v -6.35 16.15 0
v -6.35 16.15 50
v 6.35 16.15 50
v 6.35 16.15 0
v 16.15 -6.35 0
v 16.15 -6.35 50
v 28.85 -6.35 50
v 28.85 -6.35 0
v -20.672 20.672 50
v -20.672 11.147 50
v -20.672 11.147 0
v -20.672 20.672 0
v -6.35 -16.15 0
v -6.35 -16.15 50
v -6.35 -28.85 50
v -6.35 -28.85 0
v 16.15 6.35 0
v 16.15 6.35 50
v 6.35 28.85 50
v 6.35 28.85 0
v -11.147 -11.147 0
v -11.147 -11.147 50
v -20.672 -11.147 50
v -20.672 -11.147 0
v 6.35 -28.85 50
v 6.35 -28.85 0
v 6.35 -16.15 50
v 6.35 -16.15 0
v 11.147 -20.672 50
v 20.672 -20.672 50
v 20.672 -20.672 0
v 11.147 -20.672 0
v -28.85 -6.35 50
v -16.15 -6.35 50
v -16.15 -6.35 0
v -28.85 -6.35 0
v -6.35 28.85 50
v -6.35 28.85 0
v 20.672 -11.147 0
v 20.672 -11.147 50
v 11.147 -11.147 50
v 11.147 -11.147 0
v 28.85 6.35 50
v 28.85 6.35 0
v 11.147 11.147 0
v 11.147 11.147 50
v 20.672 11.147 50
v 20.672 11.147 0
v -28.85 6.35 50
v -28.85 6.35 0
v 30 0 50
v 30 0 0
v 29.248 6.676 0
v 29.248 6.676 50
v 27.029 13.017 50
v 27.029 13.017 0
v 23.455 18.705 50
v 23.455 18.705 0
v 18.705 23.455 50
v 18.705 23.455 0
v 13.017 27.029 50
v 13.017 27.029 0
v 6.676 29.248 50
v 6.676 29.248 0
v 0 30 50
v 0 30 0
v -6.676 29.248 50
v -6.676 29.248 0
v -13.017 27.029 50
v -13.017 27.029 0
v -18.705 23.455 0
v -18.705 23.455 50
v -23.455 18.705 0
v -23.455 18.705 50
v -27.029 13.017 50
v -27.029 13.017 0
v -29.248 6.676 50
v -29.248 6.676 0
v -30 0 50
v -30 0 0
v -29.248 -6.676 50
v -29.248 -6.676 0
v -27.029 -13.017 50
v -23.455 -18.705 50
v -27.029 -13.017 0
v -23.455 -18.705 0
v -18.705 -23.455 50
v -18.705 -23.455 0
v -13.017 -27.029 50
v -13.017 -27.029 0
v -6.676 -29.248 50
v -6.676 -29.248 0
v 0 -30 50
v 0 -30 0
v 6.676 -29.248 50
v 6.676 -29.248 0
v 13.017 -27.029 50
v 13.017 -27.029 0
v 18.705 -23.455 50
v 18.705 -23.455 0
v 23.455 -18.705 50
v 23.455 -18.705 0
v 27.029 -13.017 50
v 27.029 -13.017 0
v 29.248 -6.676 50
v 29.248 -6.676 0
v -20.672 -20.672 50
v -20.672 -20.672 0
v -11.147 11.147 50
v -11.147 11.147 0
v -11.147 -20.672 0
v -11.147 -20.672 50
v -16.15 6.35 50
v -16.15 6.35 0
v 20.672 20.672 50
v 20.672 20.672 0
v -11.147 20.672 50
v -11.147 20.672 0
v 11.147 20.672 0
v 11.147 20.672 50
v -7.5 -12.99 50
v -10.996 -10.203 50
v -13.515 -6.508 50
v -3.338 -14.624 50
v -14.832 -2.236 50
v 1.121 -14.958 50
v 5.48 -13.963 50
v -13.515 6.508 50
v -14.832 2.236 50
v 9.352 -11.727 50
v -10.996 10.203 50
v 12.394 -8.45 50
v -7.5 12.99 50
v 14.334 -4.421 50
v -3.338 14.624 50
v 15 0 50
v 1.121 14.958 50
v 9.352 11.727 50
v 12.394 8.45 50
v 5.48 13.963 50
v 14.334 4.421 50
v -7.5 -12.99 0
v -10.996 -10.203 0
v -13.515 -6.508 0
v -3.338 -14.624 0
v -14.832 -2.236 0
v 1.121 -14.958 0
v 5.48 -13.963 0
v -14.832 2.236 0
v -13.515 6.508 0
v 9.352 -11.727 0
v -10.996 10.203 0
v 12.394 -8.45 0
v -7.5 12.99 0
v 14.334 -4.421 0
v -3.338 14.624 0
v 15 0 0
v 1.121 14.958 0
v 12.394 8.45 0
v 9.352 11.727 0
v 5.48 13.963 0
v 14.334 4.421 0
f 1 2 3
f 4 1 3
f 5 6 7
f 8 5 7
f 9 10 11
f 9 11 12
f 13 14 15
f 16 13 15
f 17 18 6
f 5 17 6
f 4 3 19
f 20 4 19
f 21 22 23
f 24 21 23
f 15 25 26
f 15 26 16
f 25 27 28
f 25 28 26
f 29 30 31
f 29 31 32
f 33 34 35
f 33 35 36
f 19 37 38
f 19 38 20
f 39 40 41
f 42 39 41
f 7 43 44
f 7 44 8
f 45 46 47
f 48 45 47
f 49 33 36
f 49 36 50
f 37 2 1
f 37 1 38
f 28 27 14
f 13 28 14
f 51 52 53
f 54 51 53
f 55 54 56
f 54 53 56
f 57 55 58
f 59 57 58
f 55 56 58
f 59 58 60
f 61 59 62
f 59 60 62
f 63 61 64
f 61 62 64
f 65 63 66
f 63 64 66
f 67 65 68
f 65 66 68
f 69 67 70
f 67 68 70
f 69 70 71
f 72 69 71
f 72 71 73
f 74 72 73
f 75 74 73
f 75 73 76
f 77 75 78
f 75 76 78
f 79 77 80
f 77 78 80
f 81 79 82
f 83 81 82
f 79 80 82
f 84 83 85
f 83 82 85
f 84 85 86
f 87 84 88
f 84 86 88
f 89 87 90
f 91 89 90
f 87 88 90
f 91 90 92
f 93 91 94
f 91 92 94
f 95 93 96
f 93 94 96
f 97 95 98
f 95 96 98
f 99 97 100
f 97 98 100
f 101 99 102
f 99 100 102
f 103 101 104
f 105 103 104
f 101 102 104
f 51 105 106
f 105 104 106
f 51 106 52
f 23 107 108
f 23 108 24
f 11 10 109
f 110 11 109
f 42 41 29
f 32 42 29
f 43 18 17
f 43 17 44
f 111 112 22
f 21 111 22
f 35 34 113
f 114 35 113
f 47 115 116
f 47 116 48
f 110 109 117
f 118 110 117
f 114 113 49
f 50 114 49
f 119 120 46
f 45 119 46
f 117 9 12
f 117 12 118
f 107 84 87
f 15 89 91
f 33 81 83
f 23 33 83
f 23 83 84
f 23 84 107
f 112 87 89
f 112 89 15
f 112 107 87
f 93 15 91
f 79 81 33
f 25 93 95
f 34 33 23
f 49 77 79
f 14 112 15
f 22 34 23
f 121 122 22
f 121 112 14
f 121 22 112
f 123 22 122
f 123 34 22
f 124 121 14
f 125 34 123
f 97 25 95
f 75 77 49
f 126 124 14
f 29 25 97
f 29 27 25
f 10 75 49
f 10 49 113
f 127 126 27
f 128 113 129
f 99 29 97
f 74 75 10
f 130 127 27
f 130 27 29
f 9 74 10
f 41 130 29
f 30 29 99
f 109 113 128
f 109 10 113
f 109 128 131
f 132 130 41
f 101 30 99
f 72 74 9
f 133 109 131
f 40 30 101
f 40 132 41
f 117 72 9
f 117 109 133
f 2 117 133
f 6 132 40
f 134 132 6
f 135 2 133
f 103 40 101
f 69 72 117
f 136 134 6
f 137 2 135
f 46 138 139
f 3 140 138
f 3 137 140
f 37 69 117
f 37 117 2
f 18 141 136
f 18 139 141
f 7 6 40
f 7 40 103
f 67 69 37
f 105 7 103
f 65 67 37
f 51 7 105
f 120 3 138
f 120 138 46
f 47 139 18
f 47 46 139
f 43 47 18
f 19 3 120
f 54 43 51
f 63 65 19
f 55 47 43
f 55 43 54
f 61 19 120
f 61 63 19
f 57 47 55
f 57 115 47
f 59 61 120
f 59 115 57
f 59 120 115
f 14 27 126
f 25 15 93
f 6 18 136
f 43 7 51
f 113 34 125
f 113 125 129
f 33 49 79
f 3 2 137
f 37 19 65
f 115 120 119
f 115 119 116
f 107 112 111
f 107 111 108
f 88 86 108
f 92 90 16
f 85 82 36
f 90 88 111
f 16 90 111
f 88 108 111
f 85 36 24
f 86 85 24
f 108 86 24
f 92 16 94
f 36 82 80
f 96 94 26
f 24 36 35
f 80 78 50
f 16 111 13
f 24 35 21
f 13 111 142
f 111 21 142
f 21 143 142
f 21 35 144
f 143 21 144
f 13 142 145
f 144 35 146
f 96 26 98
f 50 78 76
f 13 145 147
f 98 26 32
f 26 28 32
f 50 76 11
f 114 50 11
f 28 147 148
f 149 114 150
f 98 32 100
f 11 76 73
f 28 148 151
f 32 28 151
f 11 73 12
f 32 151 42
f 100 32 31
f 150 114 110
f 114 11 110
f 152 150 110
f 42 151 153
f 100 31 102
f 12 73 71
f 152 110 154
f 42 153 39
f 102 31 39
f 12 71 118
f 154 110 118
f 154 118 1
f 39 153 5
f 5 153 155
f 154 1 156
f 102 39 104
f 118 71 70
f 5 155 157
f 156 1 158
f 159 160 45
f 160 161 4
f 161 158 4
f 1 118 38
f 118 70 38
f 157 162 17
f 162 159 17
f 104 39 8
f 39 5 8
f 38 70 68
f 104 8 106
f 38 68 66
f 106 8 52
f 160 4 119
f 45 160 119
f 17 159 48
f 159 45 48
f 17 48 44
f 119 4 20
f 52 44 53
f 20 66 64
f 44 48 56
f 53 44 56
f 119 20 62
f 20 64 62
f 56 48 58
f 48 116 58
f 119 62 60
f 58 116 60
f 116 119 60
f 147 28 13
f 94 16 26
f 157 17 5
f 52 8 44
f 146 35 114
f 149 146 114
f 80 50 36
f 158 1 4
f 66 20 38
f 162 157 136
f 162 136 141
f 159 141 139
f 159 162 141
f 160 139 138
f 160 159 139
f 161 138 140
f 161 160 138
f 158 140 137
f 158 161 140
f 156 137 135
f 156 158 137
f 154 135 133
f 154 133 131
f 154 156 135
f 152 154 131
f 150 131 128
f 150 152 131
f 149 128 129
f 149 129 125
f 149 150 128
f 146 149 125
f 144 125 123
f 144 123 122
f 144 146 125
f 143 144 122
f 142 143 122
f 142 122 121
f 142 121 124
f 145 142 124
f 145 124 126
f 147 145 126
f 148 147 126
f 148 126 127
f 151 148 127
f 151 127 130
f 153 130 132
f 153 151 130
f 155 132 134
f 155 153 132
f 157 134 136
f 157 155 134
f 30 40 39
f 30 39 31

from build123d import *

# Parameters (mm, degrees)
F0_R            = 30
F0_R_2          = 15
F1_DEPTH        = 50
F2_W            = 12.7
F2_H            = 12.7
F3_DEPTH        = 50.001
F3_COPIES_COUNT = 4
F4_W            = 9.525
F4_H            = 9.525
F5_DEPTH        = 50.001
F5_COPIES_COUNT = 4


# Not quite as in the source:
# - a pattern or mirror of a feature is missing from the dataset's text; its kind, count and spacing are read off the source's solid


with BuildPart() as f1:
    # F0 (on Top) → F1 (new body)
    with BuildSketch(Plane.XY):
        Circle(F0_R)
        Circle(F0_R_2, mode=Mode.SUBTRACT)
    extrude(amount=F1_DEPTH)

    # F2 (on face) → F3 (cut, through all)
    with BuildSketch(Plane.XY.offset(50)):
        with Locations((0, 22.5)):
            Rectangle(F2_W, F2_H)
    f3 = extrude(amount=-F3_DEPTH, mode=Mode.SUBTRACT)

    # F3_copies: F3 ×4 about axis
    f3_copies_axis = Axis((0, 0, 0), (0, 0, 1))
    for i in range(1, F3_COPIES_COUNT):
        add(f3.rotate(f3_copies_axis, i * 360 / F3_COPIES_COUNT), mode=Mode.SUBTRACT)

    # F4 (on face) → F5 (cut, through all)
    with BuildSketch(Plane.XY.offset(50)):
        with Locations((-15.9099025767, 15.9099025767)):
            Rectangle(F4_W, F4_H)
    f5 = extrude(amount=-F5_DEPTH, mode=Mode.SUBTRACT)

    # F5_copies: F5 ×4 about axis
    f5_copies_axis = Axis((0, 0, 0), (0, 0, 1))
    for i in range(1, F5_COPIES_COUNT):
        add(f5.rotate(f5_copies_axis, i * 360 / F5_COPIES_COUNT), mode=Mode.SUBTRACT)


solid = f1.part
